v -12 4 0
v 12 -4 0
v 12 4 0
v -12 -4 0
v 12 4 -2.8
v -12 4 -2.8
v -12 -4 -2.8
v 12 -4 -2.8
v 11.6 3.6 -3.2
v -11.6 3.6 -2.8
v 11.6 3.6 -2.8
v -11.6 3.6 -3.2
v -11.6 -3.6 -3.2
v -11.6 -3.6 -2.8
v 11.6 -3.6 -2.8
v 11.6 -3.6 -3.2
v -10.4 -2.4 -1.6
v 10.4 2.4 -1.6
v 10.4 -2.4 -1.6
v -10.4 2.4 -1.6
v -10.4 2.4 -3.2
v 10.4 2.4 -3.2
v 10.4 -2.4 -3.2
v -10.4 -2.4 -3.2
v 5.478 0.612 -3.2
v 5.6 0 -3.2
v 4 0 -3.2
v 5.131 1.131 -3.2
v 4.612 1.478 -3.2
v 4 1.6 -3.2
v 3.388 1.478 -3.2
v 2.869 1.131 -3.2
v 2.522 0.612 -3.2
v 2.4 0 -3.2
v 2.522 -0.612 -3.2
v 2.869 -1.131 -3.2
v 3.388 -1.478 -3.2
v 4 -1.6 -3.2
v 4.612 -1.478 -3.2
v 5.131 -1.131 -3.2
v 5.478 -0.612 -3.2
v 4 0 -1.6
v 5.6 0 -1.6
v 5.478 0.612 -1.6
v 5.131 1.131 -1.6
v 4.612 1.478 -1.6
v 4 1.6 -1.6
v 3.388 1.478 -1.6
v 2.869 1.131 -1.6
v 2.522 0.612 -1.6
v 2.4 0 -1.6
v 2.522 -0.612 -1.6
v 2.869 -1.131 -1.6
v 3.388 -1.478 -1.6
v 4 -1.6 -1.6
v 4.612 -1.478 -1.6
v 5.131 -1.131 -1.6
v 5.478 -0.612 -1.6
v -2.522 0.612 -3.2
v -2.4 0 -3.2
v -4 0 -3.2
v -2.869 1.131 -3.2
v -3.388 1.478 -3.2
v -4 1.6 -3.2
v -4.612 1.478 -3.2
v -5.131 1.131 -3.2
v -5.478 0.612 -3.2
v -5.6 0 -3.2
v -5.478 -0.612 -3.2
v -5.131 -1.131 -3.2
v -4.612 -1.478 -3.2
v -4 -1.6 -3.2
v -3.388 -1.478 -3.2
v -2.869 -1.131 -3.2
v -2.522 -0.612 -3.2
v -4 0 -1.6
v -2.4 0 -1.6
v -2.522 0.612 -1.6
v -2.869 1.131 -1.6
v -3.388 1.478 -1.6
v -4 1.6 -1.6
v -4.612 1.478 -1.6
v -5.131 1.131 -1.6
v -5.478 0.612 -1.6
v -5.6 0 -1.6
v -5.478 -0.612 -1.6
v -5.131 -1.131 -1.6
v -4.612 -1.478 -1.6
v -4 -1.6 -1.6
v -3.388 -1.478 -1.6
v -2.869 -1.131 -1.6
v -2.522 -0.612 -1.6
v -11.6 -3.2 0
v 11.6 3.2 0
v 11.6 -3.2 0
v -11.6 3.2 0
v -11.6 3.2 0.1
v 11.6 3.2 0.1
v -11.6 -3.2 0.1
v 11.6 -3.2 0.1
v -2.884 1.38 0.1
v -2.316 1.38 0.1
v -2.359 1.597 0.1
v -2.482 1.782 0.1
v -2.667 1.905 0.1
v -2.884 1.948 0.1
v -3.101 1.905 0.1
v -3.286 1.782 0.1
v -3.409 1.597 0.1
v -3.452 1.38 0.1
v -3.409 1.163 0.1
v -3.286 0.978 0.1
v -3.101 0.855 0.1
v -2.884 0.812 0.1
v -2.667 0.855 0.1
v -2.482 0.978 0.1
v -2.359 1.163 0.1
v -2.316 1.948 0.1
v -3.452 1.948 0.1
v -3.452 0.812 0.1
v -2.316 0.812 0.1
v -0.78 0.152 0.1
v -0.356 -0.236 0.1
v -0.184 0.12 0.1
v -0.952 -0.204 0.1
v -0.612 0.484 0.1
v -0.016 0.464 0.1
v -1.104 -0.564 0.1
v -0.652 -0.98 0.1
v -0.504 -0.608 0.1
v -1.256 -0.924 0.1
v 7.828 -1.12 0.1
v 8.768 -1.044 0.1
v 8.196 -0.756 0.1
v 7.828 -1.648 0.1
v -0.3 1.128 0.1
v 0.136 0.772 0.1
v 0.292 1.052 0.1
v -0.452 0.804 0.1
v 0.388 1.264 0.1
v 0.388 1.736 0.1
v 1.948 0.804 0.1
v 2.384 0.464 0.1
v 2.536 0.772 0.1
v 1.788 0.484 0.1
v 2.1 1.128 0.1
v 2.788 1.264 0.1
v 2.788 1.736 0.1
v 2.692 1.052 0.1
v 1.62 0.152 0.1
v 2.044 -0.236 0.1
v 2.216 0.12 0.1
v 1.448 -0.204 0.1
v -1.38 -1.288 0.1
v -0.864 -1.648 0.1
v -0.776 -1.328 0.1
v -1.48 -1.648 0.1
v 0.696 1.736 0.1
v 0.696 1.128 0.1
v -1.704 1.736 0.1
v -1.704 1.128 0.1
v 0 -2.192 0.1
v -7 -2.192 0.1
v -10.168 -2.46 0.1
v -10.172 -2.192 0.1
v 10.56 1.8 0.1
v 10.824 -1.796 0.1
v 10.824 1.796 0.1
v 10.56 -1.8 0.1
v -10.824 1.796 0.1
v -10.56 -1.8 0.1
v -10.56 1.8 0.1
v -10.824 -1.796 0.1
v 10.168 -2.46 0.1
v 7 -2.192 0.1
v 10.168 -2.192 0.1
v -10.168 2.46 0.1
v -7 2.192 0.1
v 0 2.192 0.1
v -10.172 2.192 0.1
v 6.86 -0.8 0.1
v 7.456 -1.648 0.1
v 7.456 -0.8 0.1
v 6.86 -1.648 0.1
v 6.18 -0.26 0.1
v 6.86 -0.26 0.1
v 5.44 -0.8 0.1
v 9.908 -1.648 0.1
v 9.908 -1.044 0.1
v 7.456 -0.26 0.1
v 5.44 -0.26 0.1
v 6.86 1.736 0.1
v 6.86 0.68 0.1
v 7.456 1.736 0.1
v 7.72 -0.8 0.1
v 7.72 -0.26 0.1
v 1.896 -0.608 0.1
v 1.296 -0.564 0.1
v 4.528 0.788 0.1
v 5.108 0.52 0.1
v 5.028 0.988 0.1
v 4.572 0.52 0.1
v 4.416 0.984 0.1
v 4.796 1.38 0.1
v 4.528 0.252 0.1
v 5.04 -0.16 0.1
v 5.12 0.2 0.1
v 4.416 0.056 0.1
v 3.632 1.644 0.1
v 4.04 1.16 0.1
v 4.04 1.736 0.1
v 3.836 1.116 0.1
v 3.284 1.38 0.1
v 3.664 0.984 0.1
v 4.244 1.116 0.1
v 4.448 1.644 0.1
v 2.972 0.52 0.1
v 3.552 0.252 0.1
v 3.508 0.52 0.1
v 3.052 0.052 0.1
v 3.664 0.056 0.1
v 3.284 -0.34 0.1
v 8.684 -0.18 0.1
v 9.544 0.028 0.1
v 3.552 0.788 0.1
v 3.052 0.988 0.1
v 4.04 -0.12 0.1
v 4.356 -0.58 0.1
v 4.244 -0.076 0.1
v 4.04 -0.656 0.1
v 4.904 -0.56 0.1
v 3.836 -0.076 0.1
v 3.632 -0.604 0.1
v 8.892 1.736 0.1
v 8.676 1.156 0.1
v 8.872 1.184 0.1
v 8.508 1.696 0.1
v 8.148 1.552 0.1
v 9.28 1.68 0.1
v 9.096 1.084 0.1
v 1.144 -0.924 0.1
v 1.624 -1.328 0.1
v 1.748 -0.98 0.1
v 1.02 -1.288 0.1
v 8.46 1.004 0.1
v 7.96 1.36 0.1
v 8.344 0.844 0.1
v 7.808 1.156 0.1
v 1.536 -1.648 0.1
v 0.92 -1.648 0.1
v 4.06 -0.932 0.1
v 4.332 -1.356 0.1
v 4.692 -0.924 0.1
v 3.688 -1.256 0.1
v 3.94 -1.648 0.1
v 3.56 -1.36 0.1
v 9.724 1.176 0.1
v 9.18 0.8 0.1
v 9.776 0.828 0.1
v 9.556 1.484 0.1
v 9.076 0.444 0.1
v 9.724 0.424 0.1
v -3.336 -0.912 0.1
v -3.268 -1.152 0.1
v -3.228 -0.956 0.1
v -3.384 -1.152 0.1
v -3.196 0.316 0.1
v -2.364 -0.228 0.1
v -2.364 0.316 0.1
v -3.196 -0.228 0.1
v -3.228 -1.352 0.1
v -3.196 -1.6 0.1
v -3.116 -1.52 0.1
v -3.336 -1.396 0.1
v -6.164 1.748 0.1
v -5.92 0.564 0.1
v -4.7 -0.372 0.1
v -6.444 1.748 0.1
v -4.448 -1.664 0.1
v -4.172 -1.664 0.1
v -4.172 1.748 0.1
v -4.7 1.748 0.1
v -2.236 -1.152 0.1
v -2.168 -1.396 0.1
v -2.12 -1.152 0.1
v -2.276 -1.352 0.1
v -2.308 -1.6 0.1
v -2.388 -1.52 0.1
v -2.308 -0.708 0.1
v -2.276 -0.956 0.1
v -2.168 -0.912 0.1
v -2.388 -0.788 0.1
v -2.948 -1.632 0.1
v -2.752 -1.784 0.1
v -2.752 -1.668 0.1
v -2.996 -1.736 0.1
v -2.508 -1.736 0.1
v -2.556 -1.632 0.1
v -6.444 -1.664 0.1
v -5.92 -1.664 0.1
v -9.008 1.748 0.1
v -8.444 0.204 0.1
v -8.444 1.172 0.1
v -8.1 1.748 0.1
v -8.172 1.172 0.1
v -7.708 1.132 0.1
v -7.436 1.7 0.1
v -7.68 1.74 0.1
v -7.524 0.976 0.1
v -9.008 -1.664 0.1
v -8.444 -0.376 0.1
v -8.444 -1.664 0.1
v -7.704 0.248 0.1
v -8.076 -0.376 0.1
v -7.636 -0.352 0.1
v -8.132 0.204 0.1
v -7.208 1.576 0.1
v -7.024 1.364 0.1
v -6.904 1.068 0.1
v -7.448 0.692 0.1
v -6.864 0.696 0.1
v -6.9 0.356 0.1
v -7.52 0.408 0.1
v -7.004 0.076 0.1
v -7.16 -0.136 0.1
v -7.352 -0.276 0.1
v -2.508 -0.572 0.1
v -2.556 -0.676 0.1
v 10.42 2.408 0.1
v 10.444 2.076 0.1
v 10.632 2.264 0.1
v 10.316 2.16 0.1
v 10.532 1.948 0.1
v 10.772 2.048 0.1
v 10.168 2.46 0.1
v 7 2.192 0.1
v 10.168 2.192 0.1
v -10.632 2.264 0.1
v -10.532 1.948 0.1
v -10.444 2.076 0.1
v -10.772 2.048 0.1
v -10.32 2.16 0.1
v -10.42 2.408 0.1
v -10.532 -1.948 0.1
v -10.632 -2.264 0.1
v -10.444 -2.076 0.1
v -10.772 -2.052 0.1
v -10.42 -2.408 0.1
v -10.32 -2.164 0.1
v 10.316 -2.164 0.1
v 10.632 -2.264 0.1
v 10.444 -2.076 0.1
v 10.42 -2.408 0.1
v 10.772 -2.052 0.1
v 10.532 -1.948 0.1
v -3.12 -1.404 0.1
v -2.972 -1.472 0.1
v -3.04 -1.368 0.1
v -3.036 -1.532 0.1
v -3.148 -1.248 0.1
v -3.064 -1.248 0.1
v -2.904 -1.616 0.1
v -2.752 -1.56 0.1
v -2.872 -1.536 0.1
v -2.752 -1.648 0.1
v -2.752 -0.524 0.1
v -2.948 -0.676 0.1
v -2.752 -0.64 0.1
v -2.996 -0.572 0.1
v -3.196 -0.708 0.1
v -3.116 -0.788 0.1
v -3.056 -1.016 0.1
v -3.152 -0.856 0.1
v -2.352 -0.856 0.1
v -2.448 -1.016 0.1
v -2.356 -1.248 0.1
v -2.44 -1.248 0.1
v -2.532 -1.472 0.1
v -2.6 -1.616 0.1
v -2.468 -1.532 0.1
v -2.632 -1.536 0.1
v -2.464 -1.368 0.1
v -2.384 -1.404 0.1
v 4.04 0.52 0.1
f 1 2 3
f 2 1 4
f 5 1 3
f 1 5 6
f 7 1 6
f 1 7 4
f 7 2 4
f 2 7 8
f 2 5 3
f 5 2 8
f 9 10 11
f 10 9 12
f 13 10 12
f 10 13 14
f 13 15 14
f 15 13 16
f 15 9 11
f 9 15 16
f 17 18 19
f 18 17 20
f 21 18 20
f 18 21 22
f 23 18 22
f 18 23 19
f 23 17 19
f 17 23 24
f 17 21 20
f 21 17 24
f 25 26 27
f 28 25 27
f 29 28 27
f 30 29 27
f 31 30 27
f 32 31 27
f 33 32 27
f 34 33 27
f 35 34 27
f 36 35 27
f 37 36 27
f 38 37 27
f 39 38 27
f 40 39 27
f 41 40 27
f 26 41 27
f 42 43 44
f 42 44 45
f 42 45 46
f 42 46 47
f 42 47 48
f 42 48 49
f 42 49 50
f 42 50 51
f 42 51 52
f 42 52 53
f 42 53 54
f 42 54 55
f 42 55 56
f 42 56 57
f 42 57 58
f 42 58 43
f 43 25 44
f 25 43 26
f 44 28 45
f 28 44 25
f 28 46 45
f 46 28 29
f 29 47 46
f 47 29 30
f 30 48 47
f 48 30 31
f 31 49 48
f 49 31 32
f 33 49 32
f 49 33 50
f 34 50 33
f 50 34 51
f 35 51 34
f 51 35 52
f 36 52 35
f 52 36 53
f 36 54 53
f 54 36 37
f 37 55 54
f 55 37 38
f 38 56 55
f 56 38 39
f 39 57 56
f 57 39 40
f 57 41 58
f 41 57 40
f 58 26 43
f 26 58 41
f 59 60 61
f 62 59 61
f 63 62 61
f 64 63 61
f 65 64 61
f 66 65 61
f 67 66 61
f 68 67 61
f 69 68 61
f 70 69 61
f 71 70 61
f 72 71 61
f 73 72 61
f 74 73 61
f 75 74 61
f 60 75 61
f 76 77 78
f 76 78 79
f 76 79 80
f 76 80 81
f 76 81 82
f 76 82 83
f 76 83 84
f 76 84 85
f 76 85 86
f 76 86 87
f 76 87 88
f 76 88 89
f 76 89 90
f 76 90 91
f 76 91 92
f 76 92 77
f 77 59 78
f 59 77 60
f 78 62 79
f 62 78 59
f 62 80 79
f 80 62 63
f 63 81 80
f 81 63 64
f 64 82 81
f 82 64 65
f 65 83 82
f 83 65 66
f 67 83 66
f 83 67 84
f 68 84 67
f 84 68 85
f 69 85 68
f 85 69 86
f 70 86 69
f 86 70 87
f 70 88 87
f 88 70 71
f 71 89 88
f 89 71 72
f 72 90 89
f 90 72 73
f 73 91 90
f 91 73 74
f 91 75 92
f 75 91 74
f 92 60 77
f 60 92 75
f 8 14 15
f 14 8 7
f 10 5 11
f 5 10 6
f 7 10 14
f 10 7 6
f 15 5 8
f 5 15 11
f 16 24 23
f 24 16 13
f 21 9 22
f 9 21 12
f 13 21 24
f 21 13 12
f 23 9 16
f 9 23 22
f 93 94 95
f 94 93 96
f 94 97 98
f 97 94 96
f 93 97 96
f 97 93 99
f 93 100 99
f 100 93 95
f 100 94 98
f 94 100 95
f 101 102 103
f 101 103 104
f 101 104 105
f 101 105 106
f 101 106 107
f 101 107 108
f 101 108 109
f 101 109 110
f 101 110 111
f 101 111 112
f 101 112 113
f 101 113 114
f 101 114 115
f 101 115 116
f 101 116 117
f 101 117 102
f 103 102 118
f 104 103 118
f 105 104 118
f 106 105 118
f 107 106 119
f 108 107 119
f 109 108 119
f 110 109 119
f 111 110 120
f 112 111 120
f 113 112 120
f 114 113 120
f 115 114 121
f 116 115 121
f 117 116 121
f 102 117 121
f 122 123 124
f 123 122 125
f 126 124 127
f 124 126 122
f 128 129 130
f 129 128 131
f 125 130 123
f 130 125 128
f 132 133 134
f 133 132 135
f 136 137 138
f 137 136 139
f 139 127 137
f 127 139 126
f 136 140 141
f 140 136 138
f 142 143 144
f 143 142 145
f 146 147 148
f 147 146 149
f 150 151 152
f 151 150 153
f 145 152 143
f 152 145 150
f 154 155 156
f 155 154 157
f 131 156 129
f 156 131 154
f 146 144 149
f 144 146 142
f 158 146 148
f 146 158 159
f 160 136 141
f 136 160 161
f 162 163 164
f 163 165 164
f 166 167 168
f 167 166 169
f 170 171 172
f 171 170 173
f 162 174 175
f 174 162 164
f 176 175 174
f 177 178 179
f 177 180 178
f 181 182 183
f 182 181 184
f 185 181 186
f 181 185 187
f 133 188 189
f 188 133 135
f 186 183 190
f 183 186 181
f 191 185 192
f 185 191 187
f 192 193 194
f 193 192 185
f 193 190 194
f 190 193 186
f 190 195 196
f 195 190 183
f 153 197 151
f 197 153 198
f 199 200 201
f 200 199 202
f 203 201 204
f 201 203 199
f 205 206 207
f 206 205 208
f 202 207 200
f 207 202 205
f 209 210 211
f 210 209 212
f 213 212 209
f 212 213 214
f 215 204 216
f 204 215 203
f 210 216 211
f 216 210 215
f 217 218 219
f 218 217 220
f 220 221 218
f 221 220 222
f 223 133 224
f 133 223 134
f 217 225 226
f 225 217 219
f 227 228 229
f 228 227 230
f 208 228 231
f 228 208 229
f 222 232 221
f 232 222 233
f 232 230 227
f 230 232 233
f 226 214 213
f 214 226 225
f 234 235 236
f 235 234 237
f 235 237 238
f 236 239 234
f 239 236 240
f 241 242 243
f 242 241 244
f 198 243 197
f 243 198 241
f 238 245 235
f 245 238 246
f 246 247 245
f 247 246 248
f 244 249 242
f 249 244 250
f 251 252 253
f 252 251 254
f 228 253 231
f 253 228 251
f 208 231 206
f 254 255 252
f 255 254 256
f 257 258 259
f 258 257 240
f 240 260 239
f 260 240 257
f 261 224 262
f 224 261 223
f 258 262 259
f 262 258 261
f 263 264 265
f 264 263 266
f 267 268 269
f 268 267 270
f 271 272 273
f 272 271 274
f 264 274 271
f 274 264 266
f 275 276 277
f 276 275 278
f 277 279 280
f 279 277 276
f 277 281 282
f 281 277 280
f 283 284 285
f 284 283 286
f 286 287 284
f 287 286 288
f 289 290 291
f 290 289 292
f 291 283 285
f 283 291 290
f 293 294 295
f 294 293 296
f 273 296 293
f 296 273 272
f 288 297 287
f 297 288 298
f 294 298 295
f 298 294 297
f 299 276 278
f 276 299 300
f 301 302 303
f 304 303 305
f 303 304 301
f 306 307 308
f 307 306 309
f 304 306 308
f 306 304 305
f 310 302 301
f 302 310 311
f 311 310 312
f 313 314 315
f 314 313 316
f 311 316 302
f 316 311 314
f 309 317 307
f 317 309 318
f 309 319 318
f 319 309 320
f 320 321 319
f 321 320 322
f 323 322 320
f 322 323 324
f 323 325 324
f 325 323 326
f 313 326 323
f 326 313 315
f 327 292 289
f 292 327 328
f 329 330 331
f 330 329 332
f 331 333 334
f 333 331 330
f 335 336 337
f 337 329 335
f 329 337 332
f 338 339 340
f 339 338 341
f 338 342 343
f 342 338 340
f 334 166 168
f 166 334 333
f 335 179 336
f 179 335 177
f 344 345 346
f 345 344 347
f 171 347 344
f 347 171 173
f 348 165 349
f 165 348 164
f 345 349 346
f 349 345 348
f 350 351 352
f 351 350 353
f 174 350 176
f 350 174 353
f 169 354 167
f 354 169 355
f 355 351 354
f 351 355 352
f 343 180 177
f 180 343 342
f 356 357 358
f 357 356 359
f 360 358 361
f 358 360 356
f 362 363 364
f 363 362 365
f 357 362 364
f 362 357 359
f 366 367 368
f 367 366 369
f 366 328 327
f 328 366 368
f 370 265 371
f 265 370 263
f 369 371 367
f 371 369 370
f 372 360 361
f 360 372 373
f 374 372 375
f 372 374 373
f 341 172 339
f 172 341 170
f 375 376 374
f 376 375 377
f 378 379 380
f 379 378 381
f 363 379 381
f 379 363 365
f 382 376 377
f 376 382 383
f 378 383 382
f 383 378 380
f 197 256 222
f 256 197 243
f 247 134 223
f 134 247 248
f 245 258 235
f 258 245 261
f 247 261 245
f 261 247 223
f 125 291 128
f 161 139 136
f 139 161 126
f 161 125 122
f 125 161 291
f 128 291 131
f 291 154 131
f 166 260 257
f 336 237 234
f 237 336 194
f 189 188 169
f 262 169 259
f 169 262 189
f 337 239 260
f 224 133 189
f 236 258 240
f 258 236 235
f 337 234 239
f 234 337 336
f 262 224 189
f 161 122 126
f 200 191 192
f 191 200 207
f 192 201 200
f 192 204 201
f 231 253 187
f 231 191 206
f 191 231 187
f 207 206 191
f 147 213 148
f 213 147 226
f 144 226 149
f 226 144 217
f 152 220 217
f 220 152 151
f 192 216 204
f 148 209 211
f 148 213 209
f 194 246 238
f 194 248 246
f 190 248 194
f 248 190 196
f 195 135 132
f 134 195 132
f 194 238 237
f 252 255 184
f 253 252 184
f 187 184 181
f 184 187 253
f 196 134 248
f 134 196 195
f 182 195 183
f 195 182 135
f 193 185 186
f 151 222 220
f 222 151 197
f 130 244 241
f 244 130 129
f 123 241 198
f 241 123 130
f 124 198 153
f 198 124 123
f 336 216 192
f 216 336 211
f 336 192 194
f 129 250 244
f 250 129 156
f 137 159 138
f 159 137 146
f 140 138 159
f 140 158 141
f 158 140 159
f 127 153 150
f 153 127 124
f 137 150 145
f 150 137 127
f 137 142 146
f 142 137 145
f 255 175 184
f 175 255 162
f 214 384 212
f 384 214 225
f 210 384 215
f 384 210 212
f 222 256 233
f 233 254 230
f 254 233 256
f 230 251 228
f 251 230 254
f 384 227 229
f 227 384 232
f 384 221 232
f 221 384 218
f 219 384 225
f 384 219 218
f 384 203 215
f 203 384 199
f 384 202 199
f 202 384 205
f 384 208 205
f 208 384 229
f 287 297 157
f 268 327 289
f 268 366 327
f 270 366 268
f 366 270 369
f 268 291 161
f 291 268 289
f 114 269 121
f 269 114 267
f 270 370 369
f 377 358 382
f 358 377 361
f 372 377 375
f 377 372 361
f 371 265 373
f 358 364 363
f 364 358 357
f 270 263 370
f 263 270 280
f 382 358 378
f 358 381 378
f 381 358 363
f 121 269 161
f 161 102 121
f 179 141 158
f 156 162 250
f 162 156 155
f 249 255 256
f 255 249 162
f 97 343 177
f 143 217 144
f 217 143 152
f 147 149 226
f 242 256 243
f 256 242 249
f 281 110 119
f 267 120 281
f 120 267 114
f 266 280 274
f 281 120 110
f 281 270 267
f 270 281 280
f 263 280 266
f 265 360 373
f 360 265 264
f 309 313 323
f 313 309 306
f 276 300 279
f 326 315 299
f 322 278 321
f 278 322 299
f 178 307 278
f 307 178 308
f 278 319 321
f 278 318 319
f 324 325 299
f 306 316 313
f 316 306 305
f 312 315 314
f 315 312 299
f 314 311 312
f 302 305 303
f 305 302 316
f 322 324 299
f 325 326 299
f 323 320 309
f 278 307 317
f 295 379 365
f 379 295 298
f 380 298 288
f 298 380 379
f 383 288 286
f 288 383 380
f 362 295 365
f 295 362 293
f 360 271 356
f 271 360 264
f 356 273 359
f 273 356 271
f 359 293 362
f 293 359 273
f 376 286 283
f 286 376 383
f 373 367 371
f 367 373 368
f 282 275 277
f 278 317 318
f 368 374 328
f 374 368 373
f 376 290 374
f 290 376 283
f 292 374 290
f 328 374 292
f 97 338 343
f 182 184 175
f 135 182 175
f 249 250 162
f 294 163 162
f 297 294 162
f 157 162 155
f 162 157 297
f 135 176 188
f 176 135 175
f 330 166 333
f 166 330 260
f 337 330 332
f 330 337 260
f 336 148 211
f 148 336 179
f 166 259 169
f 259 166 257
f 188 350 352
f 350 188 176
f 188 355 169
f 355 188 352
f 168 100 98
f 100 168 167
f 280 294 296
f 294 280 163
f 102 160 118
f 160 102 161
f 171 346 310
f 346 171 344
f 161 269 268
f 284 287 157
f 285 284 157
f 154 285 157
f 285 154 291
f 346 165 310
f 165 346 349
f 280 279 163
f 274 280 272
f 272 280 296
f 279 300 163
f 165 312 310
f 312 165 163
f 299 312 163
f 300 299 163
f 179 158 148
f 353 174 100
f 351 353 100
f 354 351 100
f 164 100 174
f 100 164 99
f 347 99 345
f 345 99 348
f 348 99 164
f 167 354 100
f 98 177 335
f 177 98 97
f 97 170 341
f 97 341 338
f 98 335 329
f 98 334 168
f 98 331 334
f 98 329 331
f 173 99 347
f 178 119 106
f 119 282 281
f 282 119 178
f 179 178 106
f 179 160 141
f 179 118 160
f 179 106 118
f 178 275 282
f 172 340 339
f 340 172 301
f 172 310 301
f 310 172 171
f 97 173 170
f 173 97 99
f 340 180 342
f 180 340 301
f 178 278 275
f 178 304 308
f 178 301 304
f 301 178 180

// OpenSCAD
use <../lib.scad>
use <6372023k.scad>
use <63864.scad>
function ldraw_lib__63864d0m() = [
// 0 Tile  1 x  3 with "PN 77 942" Licence Plate Sticker
// 0 Name: 63864d0m.dat
// 0 Author: Vincent Messenet [Cheenzo]
// 0 !LDRAW_ORG Shortcut UPDATE 2026-07
// 0 !LICENSE Licensed under CC BY 4.0 : see CAreadme.txt
// 
// 0 BFC CERTIFY CCW
  [0,"BFC","CERTIFY"],
  [0,"BFC","CCW"],
// 
// 0 !CATEGORY Sticker Shortcut
// 0 !KEYWORDS Bricklink 63864pb185, Fiat 500, set 77942
// 
// 0 !HISTORY 2026-07-30 [OrionP] Official Update 2026-07
// 
// 1 16 0 0 0 1 0 0 0 1 0 0 0 1 63864.dat
  [1,16,0,0,0,1,0,0,0,1,0,0,0,1, ldraw_lib__63864()],
// 1 16 0 0 0 1 0 0 0 1 0 0 0 1 6372023k.dat
  [1,16,0,0,0,1,0,0,0,1,0,0,0,1, ldraw_lib__6372023k()],
];
module ldraw_lib__63864d0m(step=0, col=false, unit=2/5, alt=false, line=0.2, solid=!$preview)
    makepoly(ldraw_lib__63864d0m(), step=step, col=col, unit=unit, alt=alt, line=line, solid=solid);
ldraw_lib__63864d0m(line=0.2);
